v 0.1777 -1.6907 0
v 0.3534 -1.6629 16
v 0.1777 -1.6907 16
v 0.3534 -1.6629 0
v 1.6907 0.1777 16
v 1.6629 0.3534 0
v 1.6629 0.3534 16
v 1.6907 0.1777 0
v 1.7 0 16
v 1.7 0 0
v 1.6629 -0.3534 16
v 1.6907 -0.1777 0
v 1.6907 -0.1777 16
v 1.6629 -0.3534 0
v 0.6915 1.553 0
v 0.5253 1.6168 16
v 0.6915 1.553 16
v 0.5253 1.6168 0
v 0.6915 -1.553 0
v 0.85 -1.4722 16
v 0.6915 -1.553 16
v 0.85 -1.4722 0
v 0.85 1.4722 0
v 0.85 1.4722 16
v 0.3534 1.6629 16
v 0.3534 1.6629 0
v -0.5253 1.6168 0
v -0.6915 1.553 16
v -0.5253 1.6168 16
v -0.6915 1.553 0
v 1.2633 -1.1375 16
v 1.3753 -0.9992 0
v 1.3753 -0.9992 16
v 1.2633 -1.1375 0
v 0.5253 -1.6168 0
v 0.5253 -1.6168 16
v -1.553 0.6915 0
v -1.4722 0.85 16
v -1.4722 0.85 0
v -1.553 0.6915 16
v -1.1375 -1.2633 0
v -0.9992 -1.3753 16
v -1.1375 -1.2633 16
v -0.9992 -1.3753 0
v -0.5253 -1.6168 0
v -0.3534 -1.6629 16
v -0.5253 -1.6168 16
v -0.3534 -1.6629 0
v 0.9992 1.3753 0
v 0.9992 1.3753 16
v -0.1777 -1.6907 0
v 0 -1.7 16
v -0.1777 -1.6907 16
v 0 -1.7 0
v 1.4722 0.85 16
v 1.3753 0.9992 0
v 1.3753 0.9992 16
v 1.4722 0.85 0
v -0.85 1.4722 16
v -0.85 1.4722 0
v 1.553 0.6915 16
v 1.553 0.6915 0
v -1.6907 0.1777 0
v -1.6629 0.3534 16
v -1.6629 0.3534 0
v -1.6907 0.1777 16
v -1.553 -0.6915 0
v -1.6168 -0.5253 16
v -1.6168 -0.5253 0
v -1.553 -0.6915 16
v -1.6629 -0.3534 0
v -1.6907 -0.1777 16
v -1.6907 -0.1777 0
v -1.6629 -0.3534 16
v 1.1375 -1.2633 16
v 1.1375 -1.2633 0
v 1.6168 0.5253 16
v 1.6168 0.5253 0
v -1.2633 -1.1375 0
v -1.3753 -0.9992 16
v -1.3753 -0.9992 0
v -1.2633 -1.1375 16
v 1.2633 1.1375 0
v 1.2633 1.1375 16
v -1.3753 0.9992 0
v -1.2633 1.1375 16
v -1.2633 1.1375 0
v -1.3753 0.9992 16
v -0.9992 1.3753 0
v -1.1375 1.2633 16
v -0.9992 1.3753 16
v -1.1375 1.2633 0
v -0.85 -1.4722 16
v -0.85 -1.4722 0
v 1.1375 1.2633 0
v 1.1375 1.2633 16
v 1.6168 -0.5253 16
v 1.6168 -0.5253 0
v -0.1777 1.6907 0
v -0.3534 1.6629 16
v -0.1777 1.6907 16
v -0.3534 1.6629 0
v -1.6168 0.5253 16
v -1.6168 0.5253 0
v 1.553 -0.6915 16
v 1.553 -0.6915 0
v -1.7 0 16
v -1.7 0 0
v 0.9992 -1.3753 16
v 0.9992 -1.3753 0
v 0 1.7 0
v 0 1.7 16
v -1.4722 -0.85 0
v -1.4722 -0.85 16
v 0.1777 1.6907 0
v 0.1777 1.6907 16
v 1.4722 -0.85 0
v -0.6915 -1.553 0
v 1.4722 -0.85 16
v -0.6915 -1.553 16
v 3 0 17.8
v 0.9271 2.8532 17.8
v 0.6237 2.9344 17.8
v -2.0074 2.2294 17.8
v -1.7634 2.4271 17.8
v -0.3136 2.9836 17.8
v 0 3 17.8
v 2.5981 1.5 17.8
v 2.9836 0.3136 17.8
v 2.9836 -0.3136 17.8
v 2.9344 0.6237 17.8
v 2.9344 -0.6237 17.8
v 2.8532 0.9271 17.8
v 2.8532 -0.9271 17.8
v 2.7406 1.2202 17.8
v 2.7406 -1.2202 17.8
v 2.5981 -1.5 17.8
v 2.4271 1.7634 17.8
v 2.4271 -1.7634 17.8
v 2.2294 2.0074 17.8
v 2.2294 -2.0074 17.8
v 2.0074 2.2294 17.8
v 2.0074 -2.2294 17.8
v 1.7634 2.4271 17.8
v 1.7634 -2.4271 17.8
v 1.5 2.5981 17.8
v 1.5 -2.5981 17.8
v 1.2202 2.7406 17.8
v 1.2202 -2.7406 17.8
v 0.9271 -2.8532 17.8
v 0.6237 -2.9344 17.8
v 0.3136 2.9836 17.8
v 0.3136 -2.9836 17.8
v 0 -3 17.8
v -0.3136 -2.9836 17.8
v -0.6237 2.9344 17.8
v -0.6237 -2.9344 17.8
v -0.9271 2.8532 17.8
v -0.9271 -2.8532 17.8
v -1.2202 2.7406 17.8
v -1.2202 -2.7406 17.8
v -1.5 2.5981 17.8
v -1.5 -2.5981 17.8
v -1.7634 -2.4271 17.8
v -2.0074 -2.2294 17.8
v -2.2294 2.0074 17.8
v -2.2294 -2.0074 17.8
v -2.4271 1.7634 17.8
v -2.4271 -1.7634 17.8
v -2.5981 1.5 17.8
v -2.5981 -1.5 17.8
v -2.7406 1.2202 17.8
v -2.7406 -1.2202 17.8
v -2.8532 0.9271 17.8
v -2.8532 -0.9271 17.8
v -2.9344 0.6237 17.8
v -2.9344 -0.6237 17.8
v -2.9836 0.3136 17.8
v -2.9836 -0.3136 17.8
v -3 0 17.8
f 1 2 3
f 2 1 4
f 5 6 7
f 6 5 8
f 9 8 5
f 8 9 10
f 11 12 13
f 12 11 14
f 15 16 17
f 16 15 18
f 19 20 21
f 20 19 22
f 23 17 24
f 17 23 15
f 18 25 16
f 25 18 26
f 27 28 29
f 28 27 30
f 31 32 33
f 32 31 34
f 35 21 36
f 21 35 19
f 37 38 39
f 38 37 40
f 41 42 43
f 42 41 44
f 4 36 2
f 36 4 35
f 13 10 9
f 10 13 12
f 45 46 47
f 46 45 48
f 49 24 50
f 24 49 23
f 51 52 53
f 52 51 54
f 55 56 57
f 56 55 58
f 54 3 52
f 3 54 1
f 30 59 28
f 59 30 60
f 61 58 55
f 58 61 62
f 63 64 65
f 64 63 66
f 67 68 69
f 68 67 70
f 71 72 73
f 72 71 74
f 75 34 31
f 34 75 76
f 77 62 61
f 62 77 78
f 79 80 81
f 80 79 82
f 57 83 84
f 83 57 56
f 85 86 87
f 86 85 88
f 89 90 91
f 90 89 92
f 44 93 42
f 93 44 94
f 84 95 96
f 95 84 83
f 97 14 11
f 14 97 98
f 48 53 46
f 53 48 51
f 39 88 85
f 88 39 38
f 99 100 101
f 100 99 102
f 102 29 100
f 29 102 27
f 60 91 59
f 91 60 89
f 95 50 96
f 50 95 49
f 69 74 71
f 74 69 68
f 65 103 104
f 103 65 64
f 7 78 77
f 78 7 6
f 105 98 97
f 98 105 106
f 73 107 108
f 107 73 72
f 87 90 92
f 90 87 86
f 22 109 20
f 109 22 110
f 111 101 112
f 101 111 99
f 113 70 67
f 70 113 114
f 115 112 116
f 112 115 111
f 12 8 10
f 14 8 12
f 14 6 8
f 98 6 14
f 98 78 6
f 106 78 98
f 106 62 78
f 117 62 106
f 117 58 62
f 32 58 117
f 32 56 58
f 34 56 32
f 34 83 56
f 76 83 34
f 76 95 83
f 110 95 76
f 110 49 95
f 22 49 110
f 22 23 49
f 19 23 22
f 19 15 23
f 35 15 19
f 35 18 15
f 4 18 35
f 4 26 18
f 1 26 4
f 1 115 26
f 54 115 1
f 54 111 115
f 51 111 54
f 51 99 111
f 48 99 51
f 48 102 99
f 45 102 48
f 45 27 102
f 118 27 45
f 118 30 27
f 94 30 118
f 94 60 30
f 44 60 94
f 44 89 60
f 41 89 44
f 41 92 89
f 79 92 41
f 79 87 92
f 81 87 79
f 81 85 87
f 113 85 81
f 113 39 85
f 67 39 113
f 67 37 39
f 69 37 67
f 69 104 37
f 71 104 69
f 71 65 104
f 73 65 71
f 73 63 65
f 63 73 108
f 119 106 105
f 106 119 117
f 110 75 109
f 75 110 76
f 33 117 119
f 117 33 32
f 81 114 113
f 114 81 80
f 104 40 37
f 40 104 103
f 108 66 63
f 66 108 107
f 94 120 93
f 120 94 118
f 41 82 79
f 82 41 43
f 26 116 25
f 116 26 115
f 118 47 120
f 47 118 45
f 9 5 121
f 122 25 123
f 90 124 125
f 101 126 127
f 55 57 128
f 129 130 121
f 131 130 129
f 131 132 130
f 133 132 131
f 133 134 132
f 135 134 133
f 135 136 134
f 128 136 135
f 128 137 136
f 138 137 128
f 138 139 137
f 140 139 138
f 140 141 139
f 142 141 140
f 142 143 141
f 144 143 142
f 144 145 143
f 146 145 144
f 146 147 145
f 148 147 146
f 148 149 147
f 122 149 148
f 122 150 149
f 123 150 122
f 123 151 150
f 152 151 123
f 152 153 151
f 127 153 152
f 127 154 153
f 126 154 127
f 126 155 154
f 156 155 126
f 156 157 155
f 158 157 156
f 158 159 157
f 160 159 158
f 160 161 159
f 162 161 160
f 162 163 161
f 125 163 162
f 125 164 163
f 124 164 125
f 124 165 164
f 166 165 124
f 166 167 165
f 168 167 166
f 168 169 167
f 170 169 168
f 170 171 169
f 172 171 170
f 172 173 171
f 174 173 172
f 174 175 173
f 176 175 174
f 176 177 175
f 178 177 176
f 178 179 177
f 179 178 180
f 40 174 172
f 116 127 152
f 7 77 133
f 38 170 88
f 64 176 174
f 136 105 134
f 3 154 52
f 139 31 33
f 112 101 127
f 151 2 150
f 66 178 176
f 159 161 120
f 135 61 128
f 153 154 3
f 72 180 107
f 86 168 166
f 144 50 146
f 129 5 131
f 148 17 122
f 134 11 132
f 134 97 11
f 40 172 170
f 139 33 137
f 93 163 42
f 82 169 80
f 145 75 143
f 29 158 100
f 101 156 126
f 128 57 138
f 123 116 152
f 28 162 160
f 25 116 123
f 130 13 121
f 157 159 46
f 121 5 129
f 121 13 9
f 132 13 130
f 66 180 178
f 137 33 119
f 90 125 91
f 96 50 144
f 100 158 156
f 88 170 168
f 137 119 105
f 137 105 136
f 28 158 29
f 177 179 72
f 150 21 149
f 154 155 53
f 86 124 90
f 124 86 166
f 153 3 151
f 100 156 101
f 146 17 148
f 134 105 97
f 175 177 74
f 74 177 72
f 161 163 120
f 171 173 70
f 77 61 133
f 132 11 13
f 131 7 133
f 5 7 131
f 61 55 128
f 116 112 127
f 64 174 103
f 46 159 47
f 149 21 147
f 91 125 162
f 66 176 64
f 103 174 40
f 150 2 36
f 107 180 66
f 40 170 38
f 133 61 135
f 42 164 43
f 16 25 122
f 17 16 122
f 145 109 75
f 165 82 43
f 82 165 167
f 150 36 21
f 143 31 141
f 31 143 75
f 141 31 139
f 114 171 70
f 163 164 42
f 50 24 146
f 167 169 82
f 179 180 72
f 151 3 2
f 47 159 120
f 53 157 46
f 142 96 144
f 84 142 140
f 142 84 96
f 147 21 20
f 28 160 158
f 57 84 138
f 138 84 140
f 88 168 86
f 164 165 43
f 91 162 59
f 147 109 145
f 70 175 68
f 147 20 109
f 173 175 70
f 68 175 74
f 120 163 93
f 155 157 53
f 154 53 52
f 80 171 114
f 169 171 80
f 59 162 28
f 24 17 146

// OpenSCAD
// Countersunk screw with 90-degree conical head.
$fn = 60;
eps = 0.02;
shaft_d = 3.4;
head_d = 6;
head_h = 1.8;
shaft_l = 16;
union() {
    cylinder(d = shaft_d, h = shaft_l);
    translate([0, 0, shaft_l]) cylinder(d1 = shaft_d, d2 = head_d, h = head_h);
}
